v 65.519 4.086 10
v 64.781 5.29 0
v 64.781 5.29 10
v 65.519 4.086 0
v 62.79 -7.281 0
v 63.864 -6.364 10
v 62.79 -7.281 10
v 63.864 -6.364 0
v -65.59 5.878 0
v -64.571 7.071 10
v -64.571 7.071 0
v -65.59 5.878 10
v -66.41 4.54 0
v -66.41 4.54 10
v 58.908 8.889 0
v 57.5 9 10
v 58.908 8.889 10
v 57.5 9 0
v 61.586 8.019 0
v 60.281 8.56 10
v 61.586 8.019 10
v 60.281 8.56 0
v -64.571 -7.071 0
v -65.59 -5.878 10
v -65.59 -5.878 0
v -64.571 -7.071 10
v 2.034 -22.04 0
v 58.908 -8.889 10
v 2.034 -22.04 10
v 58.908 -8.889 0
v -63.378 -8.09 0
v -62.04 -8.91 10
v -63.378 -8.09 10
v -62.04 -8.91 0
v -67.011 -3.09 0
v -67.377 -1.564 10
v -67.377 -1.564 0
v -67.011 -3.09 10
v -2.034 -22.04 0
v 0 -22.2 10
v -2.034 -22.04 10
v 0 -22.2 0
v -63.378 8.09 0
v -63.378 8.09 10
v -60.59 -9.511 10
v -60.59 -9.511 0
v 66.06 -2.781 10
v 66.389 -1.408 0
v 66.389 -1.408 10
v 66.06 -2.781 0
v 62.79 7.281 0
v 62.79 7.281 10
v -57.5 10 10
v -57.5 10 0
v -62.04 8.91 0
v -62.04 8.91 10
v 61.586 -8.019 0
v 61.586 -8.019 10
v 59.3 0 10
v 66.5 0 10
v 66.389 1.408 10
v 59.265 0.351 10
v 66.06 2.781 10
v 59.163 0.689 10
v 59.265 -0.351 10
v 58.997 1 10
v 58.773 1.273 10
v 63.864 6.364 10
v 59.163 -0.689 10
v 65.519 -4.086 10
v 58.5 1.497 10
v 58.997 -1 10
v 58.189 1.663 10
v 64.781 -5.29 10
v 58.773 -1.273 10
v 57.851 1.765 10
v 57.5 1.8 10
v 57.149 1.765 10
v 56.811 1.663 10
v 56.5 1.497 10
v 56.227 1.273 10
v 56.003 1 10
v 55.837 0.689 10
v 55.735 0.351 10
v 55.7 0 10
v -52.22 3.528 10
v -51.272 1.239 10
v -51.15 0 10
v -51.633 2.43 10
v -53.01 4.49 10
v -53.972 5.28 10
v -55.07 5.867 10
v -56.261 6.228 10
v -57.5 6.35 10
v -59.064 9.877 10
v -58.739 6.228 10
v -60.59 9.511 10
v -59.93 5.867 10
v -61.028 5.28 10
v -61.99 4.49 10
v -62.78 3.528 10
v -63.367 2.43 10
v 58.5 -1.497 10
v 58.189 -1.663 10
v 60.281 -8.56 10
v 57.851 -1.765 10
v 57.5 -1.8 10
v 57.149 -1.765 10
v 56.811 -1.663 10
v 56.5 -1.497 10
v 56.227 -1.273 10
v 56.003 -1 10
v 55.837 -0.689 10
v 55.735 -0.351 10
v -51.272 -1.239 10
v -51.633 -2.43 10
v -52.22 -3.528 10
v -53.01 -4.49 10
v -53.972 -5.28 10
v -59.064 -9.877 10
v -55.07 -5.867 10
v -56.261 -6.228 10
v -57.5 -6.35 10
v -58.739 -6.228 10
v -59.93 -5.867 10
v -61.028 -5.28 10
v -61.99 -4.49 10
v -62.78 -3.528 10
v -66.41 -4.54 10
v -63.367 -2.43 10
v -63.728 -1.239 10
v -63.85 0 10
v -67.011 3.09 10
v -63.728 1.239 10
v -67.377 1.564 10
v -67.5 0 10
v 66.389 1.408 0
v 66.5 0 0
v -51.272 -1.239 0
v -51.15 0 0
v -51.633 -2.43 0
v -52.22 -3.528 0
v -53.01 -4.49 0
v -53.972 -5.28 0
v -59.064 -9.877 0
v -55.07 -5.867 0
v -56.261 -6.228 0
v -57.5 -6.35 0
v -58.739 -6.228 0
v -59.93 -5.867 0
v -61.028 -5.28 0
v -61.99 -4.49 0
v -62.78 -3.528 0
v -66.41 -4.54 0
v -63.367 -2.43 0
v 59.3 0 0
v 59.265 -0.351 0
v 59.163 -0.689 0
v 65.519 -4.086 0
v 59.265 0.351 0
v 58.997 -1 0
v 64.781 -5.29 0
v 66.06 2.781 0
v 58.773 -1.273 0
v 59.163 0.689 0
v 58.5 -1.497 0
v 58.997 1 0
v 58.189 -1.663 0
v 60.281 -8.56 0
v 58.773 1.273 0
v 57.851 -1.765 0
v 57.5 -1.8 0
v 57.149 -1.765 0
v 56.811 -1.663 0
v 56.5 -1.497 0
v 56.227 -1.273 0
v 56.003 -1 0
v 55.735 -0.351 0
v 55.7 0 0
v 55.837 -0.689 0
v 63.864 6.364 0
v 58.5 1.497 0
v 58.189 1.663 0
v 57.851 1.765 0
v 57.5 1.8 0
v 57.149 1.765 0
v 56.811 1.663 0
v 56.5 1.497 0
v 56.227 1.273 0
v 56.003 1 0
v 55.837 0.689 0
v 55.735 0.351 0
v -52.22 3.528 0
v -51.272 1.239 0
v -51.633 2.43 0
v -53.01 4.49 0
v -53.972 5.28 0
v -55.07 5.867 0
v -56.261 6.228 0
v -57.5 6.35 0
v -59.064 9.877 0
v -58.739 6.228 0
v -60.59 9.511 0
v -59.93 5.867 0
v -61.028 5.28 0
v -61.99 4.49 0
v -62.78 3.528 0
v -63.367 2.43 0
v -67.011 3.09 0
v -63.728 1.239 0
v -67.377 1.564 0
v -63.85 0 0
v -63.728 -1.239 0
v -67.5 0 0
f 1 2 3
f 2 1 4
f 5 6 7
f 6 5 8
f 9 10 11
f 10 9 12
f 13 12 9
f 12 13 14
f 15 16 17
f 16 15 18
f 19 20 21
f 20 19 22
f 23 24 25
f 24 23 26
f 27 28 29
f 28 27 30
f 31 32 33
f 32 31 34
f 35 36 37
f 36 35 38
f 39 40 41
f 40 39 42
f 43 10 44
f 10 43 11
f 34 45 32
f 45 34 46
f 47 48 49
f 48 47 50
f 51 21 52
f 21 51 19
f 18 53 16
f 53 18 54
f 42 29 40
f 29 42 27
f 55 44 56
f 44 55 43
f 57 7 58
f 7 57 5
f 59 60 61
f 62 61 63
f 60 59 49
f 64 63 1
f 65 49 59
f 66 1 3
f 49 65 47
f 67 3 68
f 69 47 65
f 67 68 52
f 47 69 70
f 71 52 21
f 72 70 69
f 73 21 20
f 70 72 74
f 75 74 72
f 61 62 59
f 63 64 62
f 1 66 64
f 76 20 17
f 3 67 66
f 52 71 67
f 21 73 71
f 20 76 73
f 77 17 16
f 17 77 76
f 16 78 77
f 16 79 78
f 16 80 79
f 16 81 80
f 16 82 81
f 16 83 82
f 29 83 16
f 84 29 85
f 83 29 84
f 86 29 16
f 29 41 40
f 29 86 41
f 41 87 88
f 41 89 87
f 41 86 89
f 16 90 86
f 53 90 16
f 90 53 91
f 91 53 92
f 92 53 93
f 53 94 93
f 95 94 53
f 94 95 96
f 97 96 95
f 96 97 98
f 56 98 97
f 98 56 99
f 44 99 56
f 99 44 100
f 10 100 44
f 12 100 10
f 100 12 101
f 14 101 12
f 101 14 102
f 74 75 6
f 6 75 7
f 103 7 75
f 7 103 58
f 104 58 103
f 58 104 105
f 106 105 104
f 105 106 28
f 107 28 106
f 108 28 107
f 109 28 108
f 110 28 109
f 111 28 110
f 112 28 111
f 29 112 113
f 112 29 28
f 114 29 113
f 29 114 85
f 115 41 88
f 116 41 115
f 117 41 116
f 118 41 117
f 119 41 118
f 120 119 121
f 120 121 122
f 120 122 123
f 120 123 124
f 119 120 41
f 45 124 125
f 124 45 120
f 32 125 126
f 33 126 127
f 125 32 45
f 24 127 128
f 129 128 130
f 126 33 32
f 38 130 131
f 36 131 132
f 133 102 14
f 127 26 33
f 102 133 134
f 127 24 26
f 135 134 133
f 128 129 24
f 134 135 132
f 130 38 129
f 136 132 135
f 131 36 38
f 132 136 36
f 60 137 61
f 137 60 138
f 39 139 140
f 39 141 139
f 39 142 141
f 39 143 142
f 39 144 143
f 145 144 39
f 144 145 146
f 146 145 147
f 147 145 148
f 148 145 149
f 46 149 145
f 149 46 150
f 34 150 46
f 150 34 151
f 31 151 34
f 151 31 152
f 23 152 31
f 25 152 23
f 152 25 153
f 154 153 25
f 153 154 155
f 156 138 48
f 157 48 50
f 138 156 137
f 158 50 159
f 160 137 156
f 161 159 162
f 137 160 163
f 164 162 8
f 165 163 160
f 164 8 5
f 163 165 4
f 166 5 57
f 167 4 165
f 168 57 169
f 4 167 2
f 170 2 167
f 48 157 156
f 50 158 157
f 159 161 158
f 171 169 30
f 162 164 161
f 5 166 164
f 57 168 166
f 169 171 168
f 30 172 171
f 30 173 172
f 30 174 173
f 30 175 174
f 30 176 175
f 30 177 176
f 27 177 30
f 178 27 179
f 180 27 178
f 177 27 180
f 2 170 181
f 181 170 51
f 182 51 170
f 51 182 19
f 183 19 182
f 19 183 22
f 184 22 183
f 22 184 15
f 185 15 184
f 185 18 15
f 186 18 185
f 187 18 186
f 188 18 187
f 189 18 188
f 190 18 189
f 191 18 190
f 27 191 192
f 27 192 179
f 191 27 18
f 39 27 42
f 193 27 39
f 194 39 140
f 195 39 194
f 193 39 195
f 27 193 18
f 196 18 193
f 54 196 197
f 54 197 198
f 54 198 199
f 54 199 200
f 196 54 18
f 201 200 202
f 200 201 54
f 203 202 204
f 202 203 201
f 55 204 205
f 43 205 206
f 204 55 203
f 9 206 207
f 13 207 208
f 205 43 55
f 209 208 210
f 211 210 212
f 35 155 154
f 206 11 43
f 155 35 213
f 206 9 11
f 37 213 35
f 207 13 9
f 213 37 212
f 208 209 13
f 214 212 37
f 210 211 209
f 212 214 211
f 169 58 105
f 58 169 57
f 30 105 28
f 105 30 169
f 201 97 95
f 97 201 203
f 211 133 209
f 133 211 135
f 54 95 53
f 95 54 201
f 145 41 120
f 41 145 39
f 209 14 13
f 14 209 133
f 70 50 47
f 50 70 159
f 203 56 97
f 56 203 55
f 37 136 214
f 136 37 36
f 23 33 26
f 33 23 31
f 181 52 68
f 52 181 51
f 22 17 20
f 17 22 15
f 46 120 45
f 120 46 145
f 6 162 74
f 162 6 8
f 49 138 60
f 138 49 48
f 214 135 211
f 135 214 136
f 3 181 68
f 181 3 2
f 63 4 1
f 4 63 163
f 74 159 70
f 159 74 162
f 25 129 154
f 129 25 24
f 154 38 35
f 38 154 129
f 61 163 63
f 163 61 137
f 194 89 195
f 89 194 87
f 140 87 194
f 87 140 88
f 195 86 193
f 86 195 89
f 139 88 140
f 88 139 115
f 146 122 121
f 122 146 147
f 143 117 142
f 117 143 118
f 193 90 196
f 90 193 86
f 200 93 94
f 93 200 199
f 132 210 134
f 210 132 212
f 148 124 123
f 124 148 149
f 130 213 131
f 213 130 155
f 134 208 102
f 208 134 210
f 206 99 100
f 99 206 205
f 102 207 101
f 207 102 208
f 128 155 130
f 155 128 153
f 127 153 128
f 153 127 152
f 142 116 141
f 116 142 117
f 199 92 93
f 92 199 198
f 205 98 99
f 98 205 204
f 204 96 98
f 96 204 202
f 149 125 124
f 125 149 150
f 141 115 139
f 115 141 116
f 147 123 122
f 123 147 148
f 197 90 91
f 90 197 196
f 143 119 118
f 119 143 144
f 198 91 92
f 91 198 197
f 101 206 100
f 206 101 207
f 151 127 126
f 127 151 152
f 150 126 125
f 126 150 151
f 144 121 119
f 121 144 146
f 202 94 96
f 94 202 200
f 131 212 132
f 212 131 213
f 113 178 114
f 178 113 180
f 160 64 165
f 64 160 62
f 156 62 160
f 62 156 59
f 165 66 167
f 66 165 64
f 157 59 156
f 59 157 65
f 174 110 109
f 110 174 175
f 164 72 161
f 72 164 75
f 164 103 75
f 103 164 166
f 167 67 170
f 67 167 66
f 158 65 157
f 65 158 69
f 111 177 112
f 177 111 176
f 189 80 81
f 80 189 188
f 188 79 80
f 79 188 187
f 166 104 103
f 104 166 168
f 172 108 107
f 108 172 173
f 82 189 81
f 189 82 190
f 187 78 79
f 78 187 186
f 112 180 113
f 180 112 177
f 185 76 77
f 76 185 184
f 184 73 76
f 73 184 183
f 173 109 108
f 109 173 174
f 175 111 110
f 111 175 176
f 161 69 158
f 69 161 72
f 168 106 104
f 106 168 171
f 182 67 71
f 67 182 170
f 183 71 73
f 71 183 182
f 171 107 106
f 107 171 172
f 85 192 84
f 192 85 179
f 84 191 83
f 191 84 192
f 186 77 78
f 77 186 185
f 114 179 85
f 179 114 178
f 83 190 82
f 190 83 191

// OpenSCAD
$fn = 32;

// ----------------------------------------------------------------------
// Lever: 115 mm between the bosses, 10 mm thick, smooth outline
// ----------------------------------------------------------------------

// --- parameters (mm) ---
lever_l = 115;            // distance between the boss centres
boss_a = 20;              // first boss diameter
boss_b = 18;              // second boss diameter
bore_a = 12.7;            // first bore
bore_b = 3.6;             // second bore
lever_t = 10;             // lever thickness
boss_c = 26;              // middle boss diameter
bend = 9.2;               // how far the middle boss drops

lever_profile = [[-67.5, 0], [-67.377, -1.564], [-67.011, -3.09], [-66.41, -4.54], [-65.59, -5.878], [-64.571, -7.071], [-63.378, -8.09], [-62.04, -8.91], [-60.59, -9.511], [-59.064, -9.877], [-2.034, -22.04], [0, -22.2], [2.034, -22.04], [58.908, -8.889], [60.281, -8.56], [61.586, -8.019], [62.79, -7.281], [63.864, -6.364], [64.781, -5.29], [65.519, -4.086], [66.06, -2.781], [66.389, -1.408], [66.5, 0], [66.389, 1.408], [66.06, 2.781], [65.519, 4.086], [64.781, 5.29], [63.864, 6.364], [62.79, 7.281], [61.586, 8.019], [60.281, 8.56], [58.908, 8.889], [57.5, 9], [-57.5, 10], [-59.064, 9.877], [-60.59, 9.511], [-62.04, 8.91], [-63.378, 8.09], [-64.571, 7.071], [-65.59, 5.878], [-66.41, 4.54], [-67.011, 3.09], [-67.377, 1.564]];

difference() {
  linear_extrude(height = lever_t) polygon(lever_profile);
  translate([-57.5, 0, -2.5]) cylinder(h = lever_t + 5, d = bore_a);
  translate([57.5, 0, -2.5]) cylinder(h = lever_t + 5, d = bore_b);
}
